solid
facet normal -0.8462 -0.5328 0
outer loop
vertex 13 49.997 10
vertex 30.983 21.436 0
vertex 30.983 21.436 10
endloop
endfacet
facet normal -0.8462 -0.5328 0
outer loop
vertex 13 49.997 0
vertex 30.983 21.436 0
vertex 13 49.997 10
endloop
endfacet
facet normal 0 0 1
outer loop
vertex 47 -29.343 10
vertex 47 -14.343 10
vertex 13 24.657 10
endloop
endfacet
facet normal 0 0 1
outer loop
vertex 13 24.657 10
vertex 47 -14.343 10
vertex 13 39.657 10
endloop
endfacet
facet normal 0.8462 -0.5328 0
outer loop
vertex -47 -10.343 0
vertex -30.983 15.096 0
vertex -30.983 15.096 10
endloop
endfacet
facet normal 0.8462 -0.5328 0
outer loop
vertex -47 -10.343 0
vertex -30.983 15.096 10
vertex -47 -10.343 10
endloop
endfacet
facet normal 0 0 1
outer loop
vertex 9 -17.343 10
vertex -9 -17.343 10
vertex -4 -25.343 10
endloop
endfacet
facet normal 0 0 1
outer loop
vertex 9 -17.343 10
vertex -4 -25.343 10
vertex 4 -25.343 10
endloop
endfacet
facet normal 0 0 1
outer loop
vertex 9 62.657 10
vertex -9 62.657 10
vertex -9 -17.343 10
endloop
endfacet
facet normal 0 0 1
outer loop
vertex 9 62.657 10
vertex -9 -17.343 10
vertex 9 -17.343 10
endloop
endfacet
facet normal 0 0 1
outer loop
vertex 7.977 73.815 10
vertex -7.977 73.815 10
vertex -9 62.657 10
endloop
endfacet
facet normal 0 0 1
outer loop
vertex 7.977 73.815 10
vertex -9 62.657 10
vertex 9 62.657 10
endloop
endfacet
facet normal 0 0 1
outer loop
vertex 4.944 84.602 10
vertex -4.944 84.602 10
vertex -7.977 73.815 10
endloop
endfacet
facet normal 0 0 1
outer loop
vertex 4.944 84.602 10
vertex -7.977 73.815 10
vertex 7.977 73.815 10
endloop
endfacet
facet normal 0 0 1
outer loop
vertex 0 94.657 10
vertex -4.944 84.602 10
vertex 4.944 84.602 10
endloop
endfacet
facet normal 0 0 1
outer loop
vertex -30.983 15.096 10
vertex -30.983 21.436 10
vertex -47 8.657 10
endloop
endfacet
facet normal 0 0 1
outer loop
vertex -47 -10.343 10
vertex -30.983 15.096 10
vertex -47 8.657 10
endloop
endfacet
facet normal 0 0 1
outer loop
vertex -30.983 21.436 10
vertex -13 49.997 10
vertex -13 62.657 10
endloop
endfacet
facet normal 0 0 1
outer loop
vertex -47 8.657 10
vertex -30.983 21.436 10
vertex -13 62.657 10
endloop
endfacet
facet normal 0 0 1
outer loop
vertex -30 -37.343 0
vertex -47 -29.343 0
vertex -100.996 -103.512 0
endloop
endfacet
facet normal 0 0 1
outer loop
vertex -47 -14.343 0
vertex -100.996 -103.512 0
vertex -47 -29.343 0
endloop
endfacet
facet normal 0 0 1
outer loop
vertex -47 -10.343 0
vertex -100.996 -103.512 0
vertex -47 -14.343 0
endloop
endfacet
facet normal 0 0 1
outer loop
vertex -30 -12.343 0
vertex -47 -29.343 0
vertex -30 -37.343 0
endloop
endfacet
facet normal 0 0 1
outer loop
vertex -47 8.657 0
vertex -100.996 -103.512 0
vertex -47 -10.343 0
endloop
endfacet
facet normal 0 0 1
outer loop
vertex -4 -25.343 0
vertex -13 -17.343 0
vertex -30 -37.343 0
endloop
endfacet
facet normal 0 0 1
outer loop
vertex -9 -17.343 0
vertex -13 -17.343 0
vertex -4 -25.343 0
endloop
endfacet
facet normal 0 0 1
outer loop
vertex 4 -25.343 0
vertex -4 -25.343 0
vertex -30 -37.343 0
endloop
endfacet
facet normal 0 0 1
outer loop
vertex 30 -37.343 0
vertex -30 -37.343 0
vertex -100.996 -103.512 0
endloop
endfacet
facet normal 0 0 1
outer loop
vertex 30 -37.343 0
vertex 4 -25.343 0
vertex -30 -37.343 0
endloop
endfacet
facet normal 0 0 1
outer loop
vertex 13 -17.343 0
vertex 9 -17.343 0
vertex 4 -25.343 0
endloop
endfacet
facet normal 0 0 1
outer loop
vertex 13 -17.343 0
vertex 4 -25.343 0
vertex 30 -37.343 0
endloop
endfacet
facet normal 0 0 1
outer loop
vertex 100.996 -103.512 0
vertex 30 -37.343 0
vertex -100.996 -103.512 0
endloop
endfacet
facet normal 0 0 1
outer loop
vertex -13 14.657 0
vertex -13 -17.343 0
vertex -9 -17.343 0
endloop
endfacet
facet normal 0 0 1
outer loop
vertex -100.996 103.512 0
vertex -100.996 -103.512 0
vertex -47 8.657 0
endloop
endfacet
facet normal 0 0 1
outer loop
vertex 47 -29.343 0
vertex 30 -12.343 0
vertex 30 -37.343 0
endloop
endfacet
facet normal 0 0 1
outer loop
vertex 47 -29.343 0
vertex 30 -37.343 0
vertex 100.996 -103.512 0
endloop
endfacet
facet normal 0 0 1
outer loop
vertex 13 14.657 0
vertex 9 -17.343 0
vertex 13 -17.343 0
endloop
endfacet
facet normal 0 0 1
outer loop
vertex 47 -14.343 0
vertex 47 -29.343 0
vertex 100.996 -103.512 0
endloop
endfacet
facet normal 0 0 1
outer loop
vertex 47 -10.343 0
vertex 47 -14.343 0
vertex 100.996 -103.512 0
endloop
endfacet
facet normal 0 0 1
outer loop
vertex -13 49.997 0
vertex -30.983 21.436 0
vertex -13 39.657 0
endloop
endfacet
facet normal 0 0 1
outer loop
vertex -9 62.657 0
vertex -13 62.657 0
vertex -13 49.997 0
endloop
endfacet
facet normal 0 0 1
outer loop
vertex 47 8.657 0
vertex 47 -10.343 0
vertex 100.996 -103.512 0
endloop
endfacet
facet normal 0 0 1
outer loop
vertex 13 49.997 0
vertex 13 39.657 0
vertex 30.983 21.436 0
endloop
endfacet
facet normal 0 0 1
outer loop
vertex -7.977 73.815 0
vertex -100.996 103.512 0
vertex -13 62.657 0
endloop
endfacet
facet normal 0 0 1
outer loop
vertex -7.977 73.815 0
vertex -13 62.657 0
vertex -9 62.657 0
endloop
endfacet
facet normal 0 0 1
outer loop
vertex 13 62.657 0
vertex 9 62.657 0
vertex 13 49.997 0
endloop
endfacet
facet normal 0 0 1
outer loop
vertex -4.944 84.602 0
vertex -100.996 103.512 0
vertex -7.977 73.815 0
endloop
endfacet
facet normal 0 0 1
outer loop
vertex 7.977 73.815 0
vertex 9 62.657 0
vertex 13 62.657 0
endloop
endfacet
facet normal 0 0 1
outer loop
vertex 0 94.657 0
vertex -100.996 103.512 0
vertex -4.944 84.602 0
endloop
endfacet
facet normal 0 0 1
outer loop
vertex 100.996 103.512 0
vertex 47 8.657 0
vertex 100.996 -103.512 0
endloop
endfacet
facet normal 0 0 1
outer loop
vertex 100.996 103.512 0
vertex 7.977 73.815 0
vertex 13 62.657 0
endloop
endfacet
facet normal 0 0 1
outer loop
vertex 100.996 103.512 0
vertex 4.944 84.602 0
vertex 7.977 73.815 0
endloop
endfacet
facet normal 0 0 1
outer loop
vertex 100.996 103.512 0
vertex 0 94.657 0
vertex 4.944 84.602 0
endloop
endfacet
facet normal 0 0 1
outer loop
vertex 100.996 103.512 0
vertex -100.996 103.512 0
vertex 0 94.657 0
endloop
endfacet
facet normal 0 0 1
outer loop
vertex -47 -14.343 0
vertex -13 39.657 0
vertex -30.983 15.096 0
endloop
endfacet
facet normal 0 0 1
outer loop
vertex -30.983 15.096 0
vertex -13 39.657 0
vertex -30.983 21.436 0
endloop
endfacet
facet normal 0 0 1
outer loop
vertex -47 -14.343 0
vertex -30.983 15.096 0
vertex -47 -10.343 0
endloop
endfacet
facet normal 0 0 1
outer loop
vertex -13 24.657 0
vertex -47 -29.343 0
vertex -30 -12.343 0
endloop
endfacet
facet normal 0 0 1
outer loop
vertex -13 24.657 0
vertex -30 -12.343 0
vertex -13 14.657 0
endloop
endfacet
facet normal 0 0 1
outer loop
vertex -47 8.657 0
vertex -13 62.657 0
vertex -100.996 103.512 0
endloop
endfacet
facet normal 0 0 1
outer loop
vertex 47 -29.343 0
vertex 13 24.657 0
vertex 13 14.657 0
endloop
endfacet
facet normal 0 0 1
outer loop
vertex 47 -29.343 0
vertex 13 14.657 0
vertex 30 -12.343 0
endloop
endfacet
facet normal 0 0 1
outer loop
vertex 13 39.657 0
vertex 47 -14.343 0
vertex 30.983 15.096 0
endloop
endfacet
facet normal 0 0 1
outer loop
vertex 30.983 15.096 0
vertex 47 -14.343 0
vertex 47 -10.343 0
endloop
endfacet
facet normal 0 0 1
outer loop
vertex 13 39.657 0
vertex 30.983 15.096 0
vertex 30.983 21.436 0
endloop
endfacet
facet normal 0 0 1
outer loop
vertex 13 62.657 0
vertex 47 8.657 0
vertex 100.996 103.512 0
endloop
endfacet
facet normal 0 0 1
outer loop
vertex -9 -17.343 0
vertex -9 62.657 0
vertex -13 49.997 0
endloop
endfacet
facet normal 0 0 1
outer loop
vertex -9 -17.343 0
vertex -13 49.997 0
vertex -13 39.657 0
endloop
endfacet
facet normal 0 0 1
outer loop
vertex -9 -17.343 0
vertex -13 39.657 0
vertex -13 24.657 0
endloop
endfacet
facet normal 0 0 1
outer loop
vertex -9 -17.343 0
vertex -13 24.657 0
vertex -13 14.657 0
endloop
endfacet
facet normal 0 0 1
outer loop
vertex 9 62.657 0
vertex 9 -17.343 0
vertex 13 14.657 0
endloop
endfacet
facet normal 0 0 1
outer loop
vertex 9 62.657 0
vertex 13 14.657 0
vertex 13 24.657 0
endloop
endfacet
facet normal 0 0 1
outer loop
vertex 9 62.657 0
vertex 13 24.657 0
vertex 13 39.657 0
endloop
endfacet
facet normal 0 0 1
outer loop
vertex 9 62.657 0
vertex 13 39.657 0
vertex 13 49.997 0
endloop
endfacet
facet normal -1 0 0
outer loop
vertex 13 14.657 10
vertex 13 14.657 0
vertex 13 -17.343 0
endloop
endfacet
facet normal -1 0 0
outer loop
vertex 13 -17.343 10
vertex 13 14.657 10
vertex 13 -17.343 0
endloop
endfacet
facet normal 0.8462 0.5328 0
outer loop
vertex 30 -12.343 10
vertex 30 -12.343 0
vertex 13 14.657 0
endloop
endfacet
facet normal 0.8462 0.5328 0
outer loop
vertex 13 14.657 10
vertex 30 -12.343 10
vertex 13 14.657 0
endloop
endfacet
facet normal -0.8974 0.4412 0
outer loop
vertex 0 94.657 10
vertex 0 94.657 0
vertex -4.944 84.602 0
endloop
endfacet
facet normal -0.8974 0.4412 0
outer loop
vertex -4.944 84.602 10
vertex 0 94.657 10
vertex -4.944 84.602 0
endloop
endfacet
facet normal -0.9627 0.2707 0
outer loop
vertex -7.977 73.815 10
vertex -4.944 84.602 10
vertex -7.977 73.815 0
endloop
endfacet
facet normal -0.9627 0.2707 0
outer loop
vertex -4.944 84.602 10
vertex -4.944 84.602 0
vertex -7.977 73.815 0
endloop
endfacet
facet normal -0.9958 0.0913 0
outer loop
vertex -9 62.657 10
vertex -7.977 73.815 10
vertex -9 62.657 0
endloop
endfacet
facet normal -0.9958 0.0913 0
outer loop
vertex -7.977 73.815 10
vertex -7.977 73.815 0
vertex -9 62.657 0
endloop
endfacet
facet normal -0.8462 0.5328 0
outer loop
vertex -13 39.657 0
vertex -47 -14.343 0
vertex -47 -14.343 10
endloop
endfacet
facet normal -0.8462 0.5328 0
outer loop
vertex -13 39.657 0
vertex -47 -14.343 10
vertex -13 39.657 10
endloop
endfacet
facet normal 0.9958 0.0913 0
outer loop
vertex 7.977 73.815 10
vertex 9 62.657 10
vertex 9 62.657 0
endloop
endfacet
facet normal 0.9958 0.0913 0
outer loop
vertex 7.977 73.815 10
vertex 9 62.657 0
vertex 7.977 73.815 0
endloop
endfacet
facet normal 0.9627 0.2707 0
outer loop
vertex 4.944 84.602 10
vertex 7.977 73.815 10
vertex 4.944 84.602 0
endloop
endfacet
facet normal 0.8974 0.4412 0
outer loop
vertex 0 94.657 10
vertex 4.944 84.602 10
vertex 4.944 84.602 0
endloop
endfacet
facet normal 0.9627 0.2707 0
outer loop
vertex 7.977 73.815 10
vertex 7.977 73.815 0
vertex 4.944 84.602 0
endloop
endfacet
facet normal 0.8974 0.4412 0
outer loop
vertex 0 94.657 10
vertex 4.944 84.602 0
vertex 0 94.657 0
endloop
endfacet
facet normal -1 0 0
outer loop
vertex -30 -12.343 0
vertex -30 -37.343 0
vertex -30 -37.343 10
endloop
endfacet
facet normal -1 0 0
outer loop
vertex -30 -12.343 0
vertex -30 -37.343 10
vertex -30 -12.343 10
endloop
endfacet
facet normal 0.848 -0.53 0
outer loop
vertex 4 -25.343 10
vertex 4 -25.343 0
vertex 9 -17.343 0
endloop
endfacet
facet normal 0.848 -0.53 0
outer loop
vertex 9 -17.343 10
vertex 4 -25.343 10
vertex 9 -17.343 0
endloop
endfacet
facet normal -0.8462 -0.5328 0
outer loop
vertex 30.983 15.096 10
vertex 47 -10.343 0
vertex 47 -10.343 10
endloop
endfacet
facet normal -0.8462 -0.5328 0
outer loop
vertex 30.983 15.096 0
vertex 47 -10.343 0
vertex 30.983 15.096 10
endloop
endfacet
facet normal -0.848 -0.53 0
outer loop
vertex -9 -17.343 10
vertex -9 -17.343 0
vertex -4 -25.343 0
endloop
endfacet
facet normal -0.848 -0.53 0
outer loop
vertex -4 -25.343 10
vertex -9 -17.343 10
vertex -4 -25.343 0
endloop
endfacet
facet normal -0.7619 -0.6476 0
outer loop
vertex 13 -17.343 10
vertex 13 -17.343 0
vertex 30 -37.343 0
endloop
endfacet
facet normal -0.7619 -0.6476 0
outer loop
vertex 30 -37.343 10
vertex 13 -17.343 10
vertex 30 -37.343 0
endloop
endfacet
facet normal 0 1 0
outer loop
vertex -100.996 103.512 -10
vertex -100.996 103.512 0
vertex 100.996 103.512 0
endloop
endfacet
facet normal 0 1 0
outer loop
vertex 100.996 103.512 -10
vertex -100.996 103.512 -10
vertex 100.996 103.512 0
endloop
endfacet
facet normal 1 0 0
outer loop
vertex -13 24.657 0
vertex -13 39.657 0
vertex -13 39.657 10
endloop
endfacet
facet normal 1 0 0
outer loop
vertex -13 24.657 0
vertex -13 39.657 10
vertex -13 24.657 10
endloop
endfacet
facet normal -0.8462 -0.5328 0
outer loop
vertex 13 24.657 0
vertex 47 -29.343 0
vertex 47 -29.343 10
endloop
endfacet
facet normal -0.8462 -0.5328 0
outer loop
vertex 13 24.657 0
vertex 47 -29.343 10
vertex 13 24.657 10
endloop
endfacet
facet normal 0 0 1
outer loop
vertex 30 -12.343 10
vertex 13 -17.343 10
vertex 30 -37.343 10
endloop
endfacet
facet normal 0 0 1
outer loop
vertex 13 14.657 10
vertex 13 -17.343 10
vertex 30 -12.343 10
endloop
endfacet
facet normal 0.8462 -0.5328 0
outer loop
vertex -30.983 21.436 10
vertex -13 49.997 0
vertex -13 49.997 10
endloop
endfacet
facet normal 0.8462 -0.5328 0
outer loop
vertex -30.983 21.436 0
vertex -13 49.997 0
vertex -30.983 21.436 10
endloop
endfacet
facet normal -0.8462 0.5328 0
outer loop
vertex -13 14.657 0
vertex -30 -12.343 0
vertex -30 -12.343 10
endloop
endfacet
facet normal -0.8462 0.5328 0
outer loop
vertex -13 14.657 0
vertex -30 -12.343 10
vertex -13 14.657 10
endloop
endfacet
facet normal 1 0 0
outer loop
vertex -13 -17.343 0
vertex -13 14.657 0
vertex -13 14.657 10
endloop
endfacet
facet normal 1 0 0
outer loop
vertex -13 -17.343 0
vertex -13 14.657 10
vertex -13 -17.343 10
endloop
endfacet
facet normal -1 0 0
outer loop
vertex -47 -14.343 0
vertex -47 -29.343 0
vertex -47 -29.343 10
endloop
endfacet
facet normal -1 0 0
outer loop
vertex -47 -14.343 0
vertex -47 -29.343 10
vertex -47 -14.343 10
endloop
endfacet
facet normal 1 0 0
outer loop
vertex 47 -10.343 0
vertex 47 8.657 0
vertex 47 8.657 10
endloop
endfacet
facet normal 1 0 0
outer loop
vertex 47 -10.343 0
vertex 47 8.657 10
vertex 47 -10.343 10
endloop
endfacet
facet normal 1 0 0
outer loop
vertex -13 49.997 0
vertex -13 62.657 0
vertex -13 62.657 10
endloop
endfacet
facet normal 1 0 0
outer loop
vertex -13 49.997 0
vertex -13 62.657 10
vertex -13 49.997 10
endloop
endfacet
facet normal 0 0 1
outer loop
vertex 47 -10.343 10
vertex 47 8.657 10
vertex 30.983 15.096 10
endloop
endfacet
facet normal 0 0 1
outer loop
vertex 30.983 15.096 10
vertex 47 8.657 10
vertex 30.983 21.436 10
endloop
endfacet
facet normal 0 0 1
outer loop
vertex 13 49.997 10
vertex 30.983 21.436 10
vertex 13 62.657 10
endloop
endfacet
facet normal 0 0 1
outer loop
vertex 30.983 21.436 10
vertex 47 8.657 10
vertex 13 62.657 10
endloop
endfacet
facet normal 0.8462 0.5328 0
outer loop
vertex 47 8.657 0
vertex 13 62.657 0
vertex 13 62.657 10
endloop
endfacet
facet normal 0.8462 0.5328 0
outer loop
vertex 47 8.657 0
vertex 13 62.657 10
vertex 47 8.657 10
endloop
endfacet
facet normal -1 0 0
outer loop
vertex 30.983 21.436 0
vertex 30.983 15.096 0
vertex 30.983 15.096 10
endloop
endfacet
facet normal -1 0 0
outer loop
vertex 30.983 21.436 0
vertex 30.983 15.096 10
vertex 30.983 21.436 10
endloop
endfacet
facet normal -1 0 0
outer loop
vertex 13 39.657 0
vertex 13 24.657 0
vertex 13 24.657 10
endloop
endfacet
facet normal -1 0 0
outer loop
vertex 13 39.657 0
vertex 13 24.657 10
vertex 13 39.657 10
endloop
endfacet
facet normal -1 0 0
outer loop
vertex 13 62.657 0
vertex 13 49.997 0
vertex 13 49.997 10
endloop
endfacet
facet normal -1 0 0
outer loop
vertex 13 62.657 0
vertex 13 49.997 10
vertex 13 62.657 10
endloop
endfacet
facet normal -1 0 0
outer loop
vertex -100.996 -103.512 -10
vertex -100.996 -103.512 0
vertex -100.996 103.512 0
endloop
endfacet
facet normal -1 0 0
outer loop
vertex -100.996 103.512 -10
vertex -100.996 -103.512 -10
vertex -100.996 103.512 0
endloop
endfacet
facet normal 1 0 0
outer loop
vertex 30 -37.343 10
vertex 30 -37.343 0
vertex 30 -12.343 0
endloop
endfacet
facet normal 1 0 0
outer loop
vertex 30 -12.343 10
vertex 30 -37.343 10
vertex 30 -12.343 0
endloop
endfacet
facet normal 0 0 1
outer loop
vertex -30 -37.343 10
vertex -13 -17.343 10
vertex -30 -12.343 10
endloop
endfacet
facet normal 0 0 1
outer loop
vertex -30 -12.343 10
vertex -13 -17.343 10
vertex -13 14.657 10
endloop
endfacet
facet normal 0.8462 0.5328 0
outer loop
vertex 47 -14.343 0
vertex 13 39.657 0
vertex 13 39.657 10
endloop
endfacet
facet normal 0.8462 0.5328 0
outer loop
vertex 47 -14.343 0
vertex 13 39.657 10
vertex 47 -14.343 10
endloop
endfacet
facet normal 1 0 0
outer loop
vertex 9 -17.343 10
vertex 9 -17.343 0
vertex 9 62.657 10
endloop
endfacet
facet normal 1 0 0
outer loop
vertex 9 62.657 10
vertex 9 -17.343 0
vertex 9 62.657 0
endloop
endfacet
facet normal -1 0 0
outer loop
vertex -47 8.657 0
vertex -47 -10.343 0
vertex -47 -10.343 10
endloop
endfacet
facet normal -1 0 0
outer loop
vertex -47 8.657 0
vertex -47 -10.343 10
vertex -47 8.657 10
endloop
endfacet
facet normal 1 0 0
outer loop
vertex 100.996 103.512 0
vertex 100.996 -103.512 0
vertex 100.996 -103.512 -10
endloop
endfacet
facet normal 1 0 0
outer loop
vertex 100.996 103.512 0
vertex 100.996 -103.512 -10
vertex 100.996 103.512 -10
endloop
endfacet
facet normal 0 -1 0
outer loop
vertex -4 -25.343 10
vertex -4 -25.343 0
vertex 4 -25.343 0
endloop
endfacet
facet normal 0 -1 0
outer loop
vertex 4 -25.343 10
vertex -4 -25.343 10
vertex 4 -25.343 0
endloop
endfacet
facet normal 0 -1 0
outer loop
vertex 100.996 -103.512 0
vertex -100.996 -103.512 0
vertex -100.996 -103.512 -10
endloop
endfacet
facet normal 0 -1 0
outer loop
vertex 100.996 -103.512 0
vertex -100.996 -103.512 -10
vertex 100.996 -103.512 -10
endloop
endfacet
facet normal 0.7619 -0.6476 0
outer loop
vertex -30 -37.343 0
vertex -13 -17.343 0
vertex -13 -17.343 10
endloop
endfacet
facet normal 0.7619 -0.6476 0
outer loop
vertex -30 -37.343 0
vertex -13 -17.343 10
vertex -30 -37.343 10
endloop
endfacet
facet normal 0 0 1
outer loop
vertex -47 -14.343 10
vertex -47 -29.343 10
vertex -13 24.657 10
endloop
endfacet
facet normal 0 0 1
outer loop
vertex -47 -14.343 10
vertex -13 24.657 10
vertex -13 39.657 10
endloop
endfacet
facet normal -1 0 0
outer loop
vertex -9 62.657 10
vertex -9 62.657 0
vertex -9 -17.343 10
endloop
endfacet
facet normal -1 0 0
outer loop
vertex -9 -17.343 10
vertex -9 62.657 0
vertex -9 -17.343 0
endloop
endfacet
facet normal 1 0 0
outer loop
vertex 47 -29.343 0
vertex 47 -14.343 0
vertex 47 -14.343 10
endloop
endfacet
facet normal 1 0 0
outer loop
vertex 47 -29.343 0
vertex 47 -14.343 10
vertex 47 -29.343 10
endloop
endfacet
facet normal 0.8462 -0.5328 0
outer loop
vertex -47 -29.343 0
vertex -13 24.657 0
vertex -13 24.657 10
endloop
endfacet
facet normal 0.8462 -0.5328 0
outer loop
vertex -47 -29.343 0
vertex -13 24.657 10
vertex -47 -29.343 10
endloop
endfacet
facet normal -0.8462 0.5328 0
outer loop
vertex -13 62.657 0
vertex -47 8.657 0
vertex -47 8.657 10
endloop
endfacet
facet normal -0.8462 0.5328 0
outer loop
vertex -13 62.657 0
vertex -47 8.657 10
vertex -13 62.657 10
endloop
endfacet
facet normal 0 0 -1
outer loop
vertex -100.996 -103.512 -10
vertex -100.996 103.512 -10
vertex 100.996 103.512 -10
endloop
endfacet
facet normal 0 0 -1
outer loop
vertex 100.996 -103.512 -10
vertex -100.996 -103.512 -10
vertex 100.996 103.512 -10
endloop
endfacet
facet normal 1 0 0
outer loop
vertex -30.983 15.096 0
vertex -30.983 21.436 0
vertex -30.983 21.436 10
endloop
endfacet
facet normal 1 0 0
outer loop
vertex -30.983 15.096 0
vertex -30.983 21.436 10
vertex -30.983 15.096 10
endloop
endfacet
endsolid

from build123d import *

# Parameters (mm, degrees)
PAD_DEPTH    = 10
SKETCH002_W  = 201.991504
SKETCH002_H  = 207.023942
PAD001_DEPTH = 10
PAD002_DEPTH = 10
PAD003_DEPTH = 10
PAD004_DEPTH = 10


with BuildPart() as part:
    # Sketch → Pad (new body)
    with BuildSketch(Plane.XY):
        with BuildLine():
            Line((-9, 62.657148), (-9, -17.342852))
            Line((-9, -17.342852), (-4, -25.342852))
            Line((-4, -25.342852), (4, -25.342852))
            Line((4, -25.342852), (9, -17.342852))
            Line((9, -17.342852), (9, 62.657148))
            ThreePointArc((9, 62.657148), (6.707183, 79.277918), (0, 94.657148))
            ThreePointArc((0, 94.657148), (-6.707183, 79.277918), (-9, 62.657148))
        make_face()
    extrude(amount=PAD_DEPTH)

    # Sketch002 → Pad001 (join)
    with BuildSketch(Plane.XY):
        Rectangle(SKETCH002_W, SKETCH002_H)
    extrude(amount=-PAD001_DEPTH)

    # Sketch001 → Pad002 (join)
    with BuildSketch(Plane.XY):
        Polygon((13, 14.657148), (13, -17.342852), (30, -37.342852), (30, -12.342852), align=None)
        Polygon((-13, 14.657148), (-13, -17.342852), (-30, -37.342852), (-30, -12.342852), align=None)
    extrude(amount=PAD002_DEPTH)

    # Sketch003 → Pad003 (join)
    with BuildSketch(Plane.XY):
        Polygon((13, 24.657148), (13, 39.657148), (47, -14.342852), (47, -29.342852), align=None)
        Polygon((-13, 39.657148), (-13, 24.657148), (-47, -29.342852), (-47, -14.342852), align=None)
    extrude(amount=PAD003_DEPTH)

    # Sketch004 → Pad004 (join)
    with BuildSketch(Plane.XY):
        Polygon((13, 49.997148), (13, 62.657148), (47, 8.657148), (47, -10.342852), (30.983169, 15.095644), (30.983169, 21.435644), align=None)
        Polygon((-13, 62.657148), (-13, 49.997148), (-30.983169, 21.435644), (-30.983169, 15.095644), (-47, -10.342852), (-47, 8.657148), align=None)
    extrude(amount=PAD004_DEPTH)


solid = part.part
